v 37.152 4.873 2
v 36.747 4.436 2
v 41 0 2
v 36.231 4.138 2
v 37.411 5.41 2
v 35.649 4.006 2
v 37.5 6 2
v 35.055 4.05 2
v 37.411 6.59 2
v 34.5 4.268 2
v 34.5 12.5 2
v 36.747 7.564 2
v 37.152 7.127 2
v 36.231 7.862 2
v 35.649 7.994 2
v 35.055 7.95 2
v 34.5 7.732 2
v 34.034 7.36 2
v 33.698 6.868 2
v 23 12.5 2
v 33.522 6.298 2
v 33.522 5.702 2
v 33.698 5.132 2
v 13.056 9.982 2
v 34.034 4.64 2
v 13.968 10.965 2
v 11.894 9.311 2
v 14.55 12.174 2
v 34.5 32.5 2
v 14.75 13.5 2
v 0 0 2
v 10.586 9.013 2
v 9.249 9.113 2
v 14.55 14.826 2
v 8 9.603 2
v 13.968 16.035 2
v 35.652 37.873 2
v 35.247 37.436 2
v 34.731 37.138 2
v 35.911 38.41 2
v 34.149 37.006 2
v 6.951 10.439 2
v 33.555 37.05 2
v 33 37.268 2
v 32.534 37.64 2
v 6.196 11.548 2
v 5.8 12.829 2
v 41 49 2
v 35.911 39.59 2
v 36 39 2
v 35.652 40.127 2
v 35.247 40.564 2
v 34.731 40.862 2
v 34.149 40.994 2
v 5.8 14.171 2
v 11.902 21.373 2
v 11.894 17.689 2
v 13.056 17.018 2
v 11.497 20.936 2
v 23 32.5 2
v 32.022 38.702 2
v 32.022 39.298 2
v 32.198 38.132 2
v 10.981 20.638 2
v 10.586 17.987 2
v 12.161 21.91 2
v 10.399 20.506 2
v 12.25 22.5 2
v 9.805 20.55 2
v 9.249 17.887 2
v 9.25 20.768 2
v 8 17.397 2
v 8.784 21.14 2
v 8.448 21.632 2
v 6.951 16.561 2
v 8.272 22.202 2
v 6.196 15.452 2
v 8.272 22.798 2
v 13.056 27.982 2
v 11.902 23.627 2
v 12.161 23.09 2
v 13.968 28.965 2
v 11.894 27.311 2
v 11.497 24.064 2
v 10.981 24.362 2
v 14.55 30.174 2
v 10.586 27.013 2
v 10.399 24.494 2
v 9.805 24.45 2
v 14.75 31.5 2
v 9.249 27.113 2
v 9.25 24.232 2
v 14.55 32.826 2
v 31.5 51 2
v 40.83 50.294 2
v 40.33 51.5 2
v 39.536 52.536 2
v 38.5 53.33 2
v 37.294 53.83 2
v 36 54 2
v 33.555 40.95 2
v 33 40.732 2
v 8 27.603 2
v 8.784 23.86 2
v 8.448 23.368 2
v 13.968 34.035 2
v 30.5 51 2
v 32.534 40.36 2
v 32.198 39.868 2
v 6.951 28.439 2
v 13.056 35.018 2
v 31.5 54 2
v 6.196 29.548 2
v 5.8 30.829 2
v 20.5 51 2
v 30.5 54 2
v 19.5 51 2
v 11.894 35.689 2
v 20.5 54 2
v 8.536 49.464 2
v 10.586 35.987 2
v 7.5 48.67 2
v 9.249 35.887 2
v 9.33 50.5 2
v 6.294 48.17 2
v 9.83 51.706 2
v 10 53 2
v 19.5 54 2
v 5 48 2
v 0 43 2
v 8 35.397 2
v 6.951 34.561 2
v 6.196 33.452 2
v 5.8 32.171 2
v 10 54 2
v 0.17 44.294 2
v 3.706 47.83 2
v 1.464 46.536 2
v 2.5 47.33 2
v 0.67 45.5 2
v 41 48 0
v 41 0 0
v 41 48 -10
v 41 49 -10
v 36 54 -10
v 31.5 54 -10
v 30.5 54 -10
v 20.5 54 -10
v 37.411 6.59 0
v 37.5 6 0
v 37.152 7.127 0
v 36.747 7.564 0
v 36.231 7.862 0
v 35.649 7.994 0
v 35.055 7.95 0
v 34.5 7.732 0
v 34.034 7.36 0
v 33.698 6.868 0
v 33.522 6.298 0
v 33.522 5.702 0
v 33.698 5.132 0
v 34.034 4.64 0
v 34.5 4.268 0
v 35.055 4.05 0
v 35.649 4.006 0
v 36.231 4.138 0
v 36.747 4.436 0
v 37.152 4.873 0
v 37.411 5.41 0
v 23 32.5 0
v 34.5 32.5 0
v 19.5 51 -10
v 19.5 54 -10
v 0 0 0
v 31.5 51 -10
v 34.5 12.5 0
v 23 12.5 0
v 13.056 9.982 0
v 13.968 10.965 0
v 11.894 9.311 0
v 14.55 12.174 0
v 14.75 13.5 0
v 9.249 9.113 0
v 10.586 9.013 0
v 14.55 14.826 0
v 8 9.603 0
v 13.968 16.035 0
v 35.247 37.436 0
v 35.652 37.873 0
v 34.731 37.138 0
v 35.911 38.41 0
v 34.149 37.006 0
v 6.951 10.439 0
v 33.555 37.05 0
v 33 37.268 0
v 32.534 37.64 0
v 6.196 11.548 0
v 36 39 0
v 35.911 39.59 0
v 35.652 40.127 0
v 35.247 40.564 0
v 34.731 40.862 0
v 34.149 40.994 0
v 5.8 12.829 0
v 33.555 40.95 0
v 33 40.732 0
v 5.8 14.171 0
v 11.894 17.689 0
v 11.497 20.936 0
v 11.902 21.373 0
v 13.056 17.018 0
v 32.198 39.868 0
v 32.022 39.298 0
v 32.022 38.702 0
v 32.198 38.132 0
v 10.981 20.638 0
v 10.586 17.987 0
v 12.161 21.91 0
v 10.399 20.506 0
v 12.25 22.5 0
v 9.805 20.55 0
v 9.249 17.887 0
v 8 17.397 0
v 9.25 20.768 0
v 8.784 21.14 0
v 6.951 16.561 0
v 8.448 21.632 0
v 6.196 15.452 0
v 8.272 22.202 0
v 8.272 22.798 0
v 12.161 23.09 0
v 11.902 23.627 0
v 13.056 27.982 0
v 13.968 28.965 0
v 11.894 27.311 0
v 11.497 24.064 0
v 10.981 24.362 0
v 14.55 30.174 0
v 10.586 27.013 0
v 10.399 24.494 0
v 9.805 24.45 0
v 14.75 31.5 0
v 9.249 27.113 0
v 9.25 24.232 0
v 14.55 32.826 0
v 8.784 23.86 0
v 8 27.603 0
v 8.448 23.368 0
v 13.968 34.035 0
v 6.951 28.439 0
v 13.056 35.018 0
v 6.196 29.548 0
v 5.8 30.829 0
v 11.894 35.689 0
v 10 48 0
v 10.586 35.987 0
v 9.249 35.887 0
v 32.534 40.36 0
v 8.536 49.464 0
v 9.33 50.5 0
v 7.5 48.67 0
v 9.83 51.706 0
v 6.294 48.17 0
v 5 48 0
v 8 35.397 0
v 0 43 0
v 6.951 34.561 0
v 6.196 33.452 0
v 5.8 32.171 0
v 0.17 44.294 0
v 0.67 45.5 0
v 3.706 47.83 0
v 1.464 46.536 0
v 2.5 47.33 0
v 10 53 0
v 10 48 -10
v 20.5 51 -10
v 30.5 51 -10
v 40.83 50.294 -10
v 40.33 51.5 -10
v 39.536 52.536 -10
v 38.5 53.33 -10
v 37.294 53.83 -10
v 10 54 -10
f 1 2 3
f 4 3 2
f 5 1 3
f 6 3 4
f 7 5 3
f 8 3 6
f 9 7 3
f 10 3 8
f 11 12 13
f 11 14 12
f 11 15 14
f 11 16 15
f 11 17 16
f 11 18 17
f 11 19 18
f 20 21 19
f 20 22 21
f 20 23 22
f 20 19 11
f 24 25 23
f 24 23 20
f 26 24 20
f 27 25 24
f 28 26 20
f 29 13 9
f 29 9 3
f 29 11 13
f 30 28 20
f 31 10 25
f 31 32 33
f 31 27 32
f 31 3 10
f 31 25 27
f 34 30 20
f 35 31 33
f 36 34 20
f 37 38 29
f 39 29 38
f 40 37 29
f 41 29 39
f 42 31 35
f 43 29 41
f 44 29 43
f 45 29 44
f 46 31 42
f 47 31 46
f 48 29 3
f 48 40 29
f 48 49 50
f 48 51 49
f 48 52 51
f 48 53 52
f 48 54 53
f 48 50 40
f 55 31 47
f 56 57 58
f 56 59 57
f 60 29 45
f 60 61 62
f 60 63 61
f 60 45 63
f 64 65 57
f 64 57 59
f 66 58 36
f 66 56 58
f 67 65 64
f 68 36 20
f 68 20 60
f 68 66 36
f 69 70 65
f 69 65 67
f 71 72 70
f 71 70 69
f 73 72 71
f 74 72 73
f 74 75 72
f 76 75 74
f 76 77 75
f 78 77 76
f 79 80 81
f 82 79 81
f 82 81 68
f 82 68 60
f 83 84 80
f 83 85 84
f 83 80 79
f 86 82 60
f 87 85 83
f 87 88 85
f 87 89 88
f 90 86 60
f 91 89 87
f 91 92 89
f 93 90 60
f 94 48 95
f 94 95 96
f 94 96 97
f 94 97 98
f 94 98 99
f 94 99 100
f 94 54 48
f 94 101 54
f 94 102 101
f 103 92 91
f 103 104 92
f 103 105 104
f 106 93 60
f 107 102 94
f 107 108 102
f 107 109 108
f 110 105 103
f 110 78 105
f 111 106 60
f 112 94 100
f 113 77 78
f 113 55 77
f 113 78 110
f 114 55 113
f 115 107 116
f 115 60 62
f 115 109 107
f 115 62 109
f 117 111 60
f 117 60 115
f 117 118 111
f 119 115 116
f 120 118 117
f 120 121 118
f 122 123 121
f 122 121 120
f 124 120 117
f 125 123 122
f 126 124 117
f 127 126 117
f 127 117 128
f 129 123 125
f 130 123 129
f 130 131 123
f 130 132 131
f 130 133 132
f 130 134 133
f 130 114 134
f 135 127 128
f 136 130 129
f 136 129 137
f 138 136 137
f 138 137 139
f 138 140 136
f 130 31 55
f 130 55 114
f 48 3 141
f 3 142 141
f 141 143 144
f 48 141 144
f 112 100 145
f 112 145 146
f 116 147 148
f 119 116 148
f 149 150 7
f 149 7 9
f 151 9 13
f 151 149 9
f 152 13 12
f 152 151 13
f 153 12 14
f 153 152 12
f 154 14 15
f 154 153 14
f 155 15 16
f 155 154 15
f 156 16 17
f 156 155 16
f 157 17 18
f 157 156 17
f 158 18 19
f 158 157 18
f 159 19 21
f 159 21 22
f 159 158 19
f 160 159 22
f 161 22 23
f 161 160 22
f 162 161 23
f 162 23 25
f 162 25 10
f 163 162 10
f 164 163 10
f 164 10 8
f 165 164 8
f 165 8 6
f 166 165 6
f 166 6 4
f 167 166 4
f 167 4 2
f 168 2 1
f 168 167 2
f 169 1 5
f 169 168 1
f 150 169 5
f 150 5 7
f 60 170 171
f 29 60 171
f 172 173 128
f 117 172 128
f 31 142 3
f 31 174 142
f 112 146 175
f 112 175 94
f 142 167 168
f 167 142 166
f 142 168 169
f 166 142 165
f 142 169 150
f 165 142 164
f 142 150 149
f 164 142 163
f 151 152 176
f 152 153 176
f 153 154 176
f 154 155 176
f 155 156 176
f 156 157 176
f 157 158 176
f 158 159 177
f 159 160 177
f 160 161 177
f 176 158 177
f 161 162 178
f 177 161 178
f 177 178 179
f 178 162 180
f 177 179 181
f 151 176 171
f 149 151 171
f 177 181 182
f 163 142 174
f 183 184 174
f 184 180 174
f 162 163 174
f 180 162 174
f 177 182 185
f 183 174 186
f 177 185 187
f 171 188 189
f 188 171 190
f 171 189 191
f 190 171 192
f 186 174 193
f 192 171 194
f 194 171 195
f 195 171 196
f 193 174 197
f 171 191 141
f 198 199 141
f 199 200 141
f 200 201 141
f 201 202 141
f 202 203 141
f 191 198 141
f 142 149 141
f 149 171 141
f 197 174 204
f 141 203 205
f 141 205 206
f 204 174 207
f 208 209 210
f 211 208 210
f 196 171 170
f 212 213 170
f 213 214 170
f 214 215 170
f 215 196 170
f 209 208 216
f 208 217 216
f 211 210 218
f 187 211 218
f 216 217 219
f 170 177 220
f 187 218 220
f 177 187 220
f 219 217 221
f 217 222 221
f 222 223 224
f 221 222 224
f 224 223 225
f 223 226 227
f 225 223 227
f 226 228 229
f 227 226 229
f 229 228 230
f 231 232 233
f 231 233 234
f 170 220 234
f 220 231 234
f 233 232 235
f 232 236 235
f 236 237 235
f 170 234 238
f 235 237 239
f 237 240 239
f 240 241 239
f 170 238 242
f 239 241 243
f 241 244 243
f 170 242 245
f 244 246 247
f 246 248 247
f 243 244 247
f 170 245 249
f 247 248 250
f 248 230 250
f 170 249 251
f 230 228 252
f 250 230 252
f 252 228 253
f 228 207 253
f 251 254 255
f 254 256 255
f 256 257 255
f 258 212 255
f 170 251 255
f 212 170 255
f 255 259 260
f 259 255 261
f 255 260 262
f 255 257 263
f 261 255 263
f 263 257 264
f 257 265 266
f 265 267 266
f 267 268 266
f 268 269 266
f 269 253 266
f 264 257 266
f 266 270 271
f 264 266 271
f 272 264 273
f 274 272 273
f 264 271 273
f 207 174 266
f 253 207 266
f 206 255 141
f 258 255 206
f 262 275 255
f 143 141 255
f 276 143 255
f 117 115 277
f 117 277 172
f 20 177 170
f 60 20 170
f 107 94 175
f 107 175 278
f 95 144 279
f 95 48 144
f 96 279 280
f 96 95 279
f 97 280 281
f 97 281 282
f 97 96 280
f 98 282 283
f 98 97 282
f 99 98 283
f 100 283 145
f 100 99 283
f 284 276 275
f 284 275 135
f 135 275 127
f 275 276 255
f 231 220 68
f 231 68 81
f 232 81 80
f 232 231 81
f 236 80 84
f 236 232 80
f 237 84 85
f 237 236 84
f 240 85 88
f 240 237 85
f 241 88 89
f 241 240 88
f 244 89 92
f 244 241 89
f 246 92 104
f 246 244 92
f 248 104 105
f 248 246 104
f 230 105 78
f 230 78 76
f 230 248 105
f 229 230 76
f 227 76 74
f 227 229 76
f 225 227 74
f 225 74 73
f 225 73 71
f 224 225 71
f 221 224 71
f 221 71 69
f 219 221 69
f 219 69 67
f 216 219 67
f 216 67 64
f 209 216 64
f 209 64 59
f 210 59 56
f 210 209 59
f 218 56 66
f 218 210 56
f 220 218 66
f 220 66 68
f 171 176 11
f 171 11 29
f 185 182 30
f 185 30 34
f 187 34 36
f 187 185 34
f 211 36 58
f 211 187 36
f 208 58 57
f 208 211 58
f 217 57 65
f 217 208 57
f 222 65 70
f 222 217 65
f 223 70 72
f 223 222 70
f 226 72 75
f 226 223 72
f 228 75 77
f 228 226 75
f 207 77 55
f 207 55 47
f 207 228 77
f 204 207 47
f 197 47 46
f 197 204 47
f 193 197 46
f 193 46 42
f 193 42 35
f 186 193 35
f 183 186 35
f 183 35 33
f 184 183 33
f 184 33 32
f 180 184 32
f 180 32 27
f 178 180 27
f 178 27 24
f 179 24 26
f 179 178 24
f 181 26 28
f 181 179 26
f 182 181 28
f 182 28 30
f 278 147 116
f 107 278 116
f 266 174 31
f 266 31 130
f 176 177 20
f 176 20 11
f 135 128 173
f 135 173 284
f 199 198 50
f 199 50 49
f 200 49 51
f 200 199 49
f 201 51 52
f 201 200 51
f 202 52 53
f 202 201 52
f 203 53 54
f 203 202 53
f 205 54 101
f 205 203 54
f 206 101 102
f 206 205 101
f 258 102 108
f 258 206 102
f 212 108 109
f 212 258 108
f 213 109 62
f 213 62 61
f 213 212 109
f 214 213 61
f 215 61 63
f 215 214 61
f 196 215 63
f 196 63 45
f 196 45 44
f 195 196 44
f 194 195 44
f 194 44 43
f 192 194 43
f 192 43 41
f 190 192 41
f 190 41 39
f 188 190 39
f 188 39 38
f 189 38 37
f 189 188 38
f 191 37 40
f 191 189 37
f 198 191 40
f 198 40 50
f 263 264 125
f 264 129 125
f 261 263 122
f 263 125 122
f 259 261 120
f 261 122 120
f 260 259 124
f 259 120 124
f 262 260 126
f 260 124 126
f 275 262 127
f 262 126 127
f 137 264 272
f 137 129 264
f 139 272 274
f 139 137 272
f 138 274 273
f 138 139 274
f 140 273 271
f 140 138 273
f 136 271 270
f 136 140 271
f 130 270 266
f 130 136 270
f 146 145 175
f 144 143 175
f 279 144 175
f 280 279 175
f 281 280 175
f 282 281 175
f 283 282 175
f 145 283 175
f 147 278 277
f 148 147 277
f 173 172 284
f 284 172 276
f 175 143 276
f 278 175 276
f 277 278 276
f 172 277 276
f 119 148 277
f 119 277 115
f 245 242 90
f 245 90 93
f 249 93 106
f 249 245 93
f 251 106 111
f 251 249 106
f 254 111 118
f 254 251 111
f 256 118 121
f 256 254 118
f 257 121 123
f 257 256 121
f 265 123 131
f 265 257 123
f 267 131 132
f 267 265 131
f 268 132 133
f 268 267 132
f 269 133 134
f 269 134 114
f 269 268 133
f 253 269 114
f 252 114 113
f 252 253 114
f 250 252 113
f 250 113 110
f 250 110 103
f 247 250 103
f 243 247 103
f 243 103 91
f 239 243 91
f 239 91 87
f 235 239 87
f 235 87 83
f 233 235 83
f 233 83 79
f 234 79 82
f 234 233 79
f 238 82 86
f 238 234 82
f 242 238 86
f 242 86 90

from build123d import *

# Parameters (mm, degrees)
F0_W     = 40
F0_H     = 48
F0_R     = 4.5
F0_R_2   = 2
F0_W_2   = 11.5
F0_H_2   = 20
F1_DEPTH = 2
F2_W     = 31
F2_H     = 12
F3_DEPTH = 6
F4_W     = 1
F4_H     = 12
F5_DEPTH = 3
F6_DEPTH = 1
F7_R     = 4.99999
F8_R     = 5


# Not quite as in the source:
# - a fillet or chamfer is up to 0.001 mm smaller than in the source, because OpenCascade refuses the exact size


with BuildPart() as f1:
    # F0 (on Top) → F1 (new body)
    with BuildSketch(Plane.XY):
        with Locations((20, 24)):
            Rectangle(F0_W, F0_H)
        with Locations((10.25, 13.5)):
            Circle(F0_R, mode=Mode.SUBTRACT)
        with Locations((10.25, 22.5)):
            Circle(F0_R_2, mode=Mode.SUBTRACT)
        with Locations((35.5, 6)):
            Circle(F0_R_2, mode=Mode.SUBTRACT)
        with Locations((28.75, 22.5)):
            Rectangle(F0_W_2, F0_H_2, mode=Mode.SUBTRACT)
        with Locations((10.25, 31.5)):
            Circle(F0_R, mode=Mode.SUBTRACT)
        with Locations((34, 39)):
            Circle(F0_R_2, mode=Mode.SUBTRACT)
    extrude(amount=F1_DEPTH)

    # F2 (on face) → F3 (join)
    with BuildSketch(Plane(origin=(0, 48, 0), x_dir=(-1, 0, 0), z_dir=(0, 1, 0))):
        with Locations((-25.5, -4)):
            Rectangle(F2_W, F2_H)
    extrude(amount=F3_DEPTH)

    # F4 (on face) → F5 (cut)
    with BuildSketch(Plane(origin=(0, 54, 0), x_dir=(-1, 0, 0), z_dir=(0, 1, 0))):
        with Locations((-20, -4)):
            Rectangle(F4_W, F4_H)
        with Locations((-31, -4)):
            Rectangle(F4_W, F4_H)
    extrude(amount=-F5_DEPTH, mode=Mode.SUBTRACT)

    # F6 (add): a face of the model
    f6_faces = [f1.faces().sort_by_distance(p)[0] for p in [
        (40, 24, 1),
    ]]
    extrude(f6_faces, amount=F6_DEPTH)

    # F7 (radius 5 in the source; OpenCascade refuses exactly that, so slightly less here)
    f7_edges = [f1.edges().sort_by_distance(p)[0] for p in [
        (10, 48, 1),
        (0, 48, 1),
    ]]
    fillet(f7_edges, radius=F7_R)

    # F8
    f8_edges = [f1.edges().sort_by_distance(p)[0] for p in [
        (41, 54, -4),
    ]]
    fillet(f8_edges, radius=F8_R)


solid = f1.part
